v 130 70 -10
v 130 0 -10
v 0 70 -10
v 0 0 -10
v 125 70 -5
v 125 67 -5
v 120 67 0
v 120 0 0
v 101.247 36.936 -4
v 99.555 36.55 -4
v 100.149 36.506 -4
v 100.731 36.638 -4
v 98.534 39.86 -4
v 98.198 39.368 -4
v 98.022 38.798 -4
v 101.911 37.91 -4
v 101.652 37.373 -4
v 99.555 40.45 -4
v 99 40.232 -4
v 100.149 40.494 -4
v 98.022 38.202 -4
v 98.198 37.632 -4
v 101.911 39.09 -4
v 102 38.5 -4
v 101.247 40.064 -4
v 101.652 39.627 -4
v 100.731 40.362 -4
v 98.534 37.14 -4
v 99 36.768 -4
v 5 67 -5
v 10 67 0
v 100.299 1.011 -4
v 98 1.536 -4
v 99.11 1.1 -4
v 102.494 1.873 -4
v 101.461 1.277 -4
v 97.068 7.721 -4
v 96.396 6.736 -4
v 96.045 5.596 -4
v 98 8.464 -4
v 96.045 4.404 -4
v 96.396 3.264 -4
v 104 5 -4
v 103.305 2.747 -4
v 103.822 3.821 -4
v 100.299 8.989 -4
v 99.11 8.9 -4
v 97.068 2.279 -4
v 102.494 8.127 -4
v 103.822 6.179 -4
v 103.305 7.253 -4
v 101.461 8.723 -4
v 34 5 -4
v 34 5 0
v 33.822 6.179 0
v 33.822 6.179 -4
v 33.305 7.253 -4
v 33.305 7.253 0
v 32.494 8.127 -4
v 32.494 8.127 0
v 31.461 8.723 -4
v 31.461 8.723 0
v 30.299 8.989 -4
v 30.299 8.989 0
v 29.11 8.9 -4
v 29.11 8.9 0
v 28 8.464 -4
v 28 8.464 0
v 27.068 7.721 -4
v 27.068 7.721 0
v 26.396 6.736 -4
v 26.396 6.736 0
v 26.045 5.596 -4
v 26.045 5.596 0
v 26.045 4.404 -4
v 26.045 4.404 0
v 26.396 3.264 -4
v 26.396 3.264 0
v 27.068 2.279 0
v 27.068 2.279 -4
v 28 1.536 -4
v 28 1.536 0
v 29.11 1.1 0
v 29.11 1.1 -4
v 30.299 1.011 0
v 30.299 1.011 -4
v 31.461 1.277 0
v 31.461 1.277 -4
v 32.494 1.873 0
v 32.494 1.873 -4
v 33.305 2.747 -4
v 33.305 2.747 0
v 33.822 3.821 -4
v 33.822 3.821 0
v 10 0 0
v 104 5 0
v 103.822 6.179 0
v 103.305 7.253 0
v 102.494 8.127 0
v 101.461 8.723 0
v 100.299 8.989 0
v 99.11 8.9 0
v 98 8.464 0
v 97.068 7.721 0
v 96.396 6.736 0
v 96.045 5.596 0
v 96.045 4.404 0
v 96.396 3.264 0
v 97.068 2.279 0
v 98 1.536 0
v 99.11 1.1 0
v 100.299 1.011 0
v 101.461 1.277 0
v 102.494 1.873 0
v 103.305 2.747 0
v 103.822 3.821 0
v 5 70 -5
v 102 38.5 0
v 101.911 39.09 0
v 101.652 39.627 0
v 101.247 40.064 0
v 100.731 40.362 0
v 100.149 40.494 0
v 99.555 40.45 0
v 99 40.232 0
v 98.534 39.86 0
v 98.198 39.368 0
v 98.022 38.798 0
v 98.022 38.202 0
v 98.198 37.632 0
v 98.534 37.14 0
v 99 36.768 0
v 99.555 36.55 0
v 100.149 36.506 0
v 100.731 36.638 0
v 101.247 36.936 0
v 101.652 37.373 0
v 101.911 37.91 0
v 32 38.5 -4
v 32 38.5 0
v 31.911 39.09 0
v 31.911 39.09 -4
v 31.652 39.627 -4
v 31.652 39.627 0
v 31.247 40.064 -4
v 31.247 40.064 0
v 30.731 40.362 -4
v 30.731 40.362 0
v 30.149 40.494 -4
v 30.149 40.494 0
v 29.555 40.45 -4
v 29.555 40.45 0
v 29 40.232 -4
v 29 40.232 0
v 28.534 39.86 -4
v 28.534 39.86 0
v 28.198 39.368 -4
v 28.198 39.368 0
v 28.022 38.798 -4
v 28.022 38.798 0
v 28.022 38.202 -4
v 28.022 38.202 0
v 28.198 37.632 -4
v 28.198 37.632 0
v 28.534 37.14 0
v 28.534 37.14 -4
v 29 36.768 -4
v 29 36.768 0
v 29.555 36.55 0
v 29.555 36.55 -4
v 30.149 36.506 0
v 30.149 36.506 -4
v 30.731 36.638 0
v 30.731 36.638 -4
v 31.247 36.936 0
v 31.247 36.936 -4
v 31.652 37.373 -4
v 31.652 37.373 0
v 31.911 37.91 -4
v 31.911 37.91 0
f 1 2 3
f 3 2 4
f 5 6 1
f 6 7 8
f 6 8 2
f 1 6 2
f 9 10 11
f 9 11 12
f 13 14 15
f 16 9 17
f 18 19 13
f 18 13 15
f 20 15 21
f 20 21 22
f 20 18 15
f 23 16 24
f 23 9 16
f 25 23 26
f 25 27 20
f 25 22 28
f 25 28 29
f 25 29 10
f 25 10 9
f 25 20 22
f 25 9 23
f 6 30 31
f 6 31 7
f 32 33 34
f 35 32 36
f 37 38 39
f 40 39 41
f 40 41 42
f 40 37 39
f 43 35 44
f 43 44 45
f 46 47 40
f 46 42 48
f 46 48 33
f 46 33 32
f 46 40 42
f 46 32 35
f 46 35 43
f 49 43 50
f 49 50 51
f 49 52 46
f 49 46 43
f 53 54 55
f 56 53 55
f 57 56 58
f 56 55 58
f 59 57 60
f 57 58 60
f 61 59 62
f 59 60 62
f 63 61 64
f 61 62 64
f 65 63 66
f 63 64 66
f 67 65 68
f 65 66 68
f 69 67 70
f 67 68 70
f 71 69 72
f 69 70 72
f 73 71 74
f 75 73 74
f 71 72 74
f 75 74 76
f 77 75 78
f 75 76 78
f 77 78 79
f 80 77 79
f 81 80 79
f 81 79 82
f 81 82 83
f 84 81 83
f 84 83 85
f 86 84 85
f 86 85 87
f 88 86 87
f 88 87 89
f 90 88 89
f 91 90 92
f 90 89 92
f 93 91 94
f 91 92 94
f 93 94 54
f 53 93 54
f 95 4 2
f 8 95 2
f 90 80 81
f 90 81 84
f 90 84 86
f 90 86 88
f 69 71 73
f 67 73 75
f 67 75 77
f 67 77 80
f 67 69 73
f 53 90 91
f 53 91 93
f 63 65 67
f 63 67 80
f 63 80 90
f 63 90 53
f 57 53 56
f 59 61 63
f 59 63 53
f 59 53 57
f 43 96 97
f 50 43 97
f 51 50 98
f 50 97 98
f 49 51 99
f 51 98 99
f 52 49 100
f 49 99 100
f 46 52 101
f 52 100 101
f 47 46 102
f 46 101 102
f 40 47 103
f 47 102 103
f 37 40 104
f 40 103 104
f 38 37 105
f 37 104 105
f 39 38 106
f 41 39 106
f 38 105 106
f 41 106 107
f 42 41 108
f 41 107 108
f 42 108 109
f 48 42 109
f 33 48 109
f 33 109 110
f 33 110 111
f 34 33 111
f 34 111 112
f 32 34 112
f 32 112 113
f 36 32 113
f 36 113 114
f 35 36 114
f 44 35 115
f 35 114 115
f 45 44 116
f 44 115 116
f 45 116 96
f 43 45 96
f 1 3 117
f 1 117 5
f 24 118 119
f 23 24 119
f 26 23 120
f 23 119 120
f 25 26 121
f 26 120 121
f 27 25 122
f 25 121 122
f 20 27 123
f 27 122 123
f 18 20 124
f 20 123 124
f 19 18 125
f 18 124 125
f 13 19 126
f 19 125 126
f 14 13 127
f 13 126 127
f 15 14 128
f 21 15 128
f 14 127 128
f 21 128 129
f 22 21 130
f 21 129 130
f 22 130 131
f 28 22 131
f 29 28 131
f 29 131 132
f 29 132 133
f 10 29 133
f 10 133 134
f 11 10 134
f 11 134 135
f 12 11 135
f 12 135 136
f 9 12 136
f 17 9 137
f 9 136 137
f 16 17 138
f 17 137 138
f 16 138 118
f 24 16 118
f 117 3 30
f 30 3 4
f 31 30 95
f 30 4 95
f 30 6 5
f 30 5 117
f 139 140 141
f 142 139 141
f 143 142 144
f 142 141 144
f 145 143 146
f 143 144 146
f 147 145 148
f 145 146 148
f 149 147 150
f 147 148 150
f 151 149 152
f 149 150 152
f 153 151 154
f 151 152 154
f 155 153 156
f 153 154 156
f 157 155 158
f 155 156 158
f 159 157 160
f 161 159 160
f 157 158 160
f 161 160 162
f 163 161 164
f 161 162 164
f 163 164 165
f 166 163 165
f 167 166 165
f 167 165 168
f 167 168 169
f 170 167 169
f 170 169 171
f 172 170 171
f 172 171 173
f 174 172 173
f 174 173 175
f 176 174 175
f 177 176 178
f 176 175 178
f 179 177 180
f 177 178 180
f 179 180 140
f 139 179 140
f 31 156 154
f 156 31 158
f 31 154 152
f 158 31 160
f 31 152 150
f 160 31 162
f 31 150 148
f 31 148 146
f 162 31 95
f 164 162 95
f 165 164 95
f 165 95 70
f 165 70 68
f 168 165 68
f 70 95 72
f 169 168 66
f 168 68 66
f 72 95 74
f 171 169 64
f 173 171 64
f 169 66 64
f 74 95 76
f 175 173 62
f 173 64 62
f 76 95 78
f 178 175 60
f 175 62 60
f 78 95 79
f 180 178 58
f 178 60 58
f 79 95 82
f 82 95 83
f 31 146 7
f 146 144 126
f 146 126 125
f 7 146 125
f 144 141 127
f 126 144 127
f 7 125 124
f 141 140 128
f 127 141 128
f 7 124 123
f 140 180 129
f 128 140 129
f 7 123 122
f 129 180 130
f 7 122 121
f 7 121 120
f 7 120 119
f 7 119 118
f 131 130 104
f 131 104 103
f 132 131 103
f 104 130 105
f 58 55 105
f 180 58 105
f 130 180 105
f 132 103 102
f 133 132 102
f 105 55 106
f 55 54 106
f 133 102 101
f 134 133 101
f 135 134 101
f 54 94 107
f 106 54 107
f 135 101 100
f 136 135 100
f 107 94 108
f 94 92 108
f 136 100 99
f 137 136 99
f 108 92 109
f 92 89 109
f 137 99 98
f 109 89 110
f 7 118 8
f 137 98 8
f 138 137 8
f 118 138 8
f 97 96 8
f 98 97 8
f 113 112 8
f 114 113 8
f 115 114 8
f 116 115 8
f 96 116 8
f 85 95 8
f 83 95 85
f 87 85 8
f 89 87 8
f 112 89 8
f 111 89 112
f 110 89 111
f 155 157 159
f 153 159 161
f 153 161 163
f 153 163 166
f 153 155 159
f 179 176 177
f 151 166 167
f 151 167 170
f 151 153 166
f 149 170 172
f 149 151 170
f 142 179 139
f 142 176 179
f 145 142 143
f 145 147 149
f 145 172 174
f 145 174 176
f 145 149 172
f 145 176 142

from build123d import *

# Parameters (mm, degrees)
BOSS_EXTRUDE1_DEPTH     = 70
CUT_EXTRUDE1_DEPTH      = 148.986485869
CUT_EXTRUDE1_DEPTH_BACK = 3
SKETCH3_R               = 4
CUT_EXTRUDE2_DEPTH      = 4
SKETCH4_R               = 2
CUT_EXTRUDE3_DEPTH      = 4


with BuildPart() as part:
    # Sketch1 → Boss-Extrude1 (new body)
    with BuildSketch(Plane(origin=(0, 0, 0), x_dir=(1, 0, 0), z_dir=(0, 1, 0))):
        Polygon((130, 10), (0, 10), (10, 0), (120, 0), align=None)
    extrude(amount=BOSS_EXTRUDE1_DEPTH)

    # Sketch2 → Cut-Extrude1 (cut, two sides: drawn at the far end of the back side and taken through both)
    with BuildSketch(Plane(origin=(0, 70, 0), x_dir=(1, 0, 0), z_dir=(0, 1, 0)).offset(-CUT_EXTRUDE1_DEPTH_BACK)):
        Polygon((125, 5), (5, 5), (10, 0), (120, 0), align=None)
    extrude(amount=CUT_EXTRUDE1_DEPTH + CUT_EXTRUDE1_DEPTH_BACK, mode=Mode.SUBTRACT)

    # Sketch3 → Cut-Extrude2 (cut)
    with BuildSketch(Plane.XY):
        with Locations((30, 5)):
            Circle(SKETCH3_R)
        with Locations((100, 5)):
            Circle(SKETCH3_R)
    extrude(amount=-CUT_EXTRUDE2_DEPTH, mode=Mode.SUBTRACT)

    # Sketch4 → Cut-Extrude3 (cut)
    with BuildSketch(Plane.XY):
        with Locations((30, 38.5)):
            Circle(SKETCH4_R)
        with Locations((100, 38.5)):
            Circle(SKETCH4_R)
    extrude(amount=-CUT_EXTRUDE3_DEPTH, mode=Mode.SUBTRACT)


solid = part.part
